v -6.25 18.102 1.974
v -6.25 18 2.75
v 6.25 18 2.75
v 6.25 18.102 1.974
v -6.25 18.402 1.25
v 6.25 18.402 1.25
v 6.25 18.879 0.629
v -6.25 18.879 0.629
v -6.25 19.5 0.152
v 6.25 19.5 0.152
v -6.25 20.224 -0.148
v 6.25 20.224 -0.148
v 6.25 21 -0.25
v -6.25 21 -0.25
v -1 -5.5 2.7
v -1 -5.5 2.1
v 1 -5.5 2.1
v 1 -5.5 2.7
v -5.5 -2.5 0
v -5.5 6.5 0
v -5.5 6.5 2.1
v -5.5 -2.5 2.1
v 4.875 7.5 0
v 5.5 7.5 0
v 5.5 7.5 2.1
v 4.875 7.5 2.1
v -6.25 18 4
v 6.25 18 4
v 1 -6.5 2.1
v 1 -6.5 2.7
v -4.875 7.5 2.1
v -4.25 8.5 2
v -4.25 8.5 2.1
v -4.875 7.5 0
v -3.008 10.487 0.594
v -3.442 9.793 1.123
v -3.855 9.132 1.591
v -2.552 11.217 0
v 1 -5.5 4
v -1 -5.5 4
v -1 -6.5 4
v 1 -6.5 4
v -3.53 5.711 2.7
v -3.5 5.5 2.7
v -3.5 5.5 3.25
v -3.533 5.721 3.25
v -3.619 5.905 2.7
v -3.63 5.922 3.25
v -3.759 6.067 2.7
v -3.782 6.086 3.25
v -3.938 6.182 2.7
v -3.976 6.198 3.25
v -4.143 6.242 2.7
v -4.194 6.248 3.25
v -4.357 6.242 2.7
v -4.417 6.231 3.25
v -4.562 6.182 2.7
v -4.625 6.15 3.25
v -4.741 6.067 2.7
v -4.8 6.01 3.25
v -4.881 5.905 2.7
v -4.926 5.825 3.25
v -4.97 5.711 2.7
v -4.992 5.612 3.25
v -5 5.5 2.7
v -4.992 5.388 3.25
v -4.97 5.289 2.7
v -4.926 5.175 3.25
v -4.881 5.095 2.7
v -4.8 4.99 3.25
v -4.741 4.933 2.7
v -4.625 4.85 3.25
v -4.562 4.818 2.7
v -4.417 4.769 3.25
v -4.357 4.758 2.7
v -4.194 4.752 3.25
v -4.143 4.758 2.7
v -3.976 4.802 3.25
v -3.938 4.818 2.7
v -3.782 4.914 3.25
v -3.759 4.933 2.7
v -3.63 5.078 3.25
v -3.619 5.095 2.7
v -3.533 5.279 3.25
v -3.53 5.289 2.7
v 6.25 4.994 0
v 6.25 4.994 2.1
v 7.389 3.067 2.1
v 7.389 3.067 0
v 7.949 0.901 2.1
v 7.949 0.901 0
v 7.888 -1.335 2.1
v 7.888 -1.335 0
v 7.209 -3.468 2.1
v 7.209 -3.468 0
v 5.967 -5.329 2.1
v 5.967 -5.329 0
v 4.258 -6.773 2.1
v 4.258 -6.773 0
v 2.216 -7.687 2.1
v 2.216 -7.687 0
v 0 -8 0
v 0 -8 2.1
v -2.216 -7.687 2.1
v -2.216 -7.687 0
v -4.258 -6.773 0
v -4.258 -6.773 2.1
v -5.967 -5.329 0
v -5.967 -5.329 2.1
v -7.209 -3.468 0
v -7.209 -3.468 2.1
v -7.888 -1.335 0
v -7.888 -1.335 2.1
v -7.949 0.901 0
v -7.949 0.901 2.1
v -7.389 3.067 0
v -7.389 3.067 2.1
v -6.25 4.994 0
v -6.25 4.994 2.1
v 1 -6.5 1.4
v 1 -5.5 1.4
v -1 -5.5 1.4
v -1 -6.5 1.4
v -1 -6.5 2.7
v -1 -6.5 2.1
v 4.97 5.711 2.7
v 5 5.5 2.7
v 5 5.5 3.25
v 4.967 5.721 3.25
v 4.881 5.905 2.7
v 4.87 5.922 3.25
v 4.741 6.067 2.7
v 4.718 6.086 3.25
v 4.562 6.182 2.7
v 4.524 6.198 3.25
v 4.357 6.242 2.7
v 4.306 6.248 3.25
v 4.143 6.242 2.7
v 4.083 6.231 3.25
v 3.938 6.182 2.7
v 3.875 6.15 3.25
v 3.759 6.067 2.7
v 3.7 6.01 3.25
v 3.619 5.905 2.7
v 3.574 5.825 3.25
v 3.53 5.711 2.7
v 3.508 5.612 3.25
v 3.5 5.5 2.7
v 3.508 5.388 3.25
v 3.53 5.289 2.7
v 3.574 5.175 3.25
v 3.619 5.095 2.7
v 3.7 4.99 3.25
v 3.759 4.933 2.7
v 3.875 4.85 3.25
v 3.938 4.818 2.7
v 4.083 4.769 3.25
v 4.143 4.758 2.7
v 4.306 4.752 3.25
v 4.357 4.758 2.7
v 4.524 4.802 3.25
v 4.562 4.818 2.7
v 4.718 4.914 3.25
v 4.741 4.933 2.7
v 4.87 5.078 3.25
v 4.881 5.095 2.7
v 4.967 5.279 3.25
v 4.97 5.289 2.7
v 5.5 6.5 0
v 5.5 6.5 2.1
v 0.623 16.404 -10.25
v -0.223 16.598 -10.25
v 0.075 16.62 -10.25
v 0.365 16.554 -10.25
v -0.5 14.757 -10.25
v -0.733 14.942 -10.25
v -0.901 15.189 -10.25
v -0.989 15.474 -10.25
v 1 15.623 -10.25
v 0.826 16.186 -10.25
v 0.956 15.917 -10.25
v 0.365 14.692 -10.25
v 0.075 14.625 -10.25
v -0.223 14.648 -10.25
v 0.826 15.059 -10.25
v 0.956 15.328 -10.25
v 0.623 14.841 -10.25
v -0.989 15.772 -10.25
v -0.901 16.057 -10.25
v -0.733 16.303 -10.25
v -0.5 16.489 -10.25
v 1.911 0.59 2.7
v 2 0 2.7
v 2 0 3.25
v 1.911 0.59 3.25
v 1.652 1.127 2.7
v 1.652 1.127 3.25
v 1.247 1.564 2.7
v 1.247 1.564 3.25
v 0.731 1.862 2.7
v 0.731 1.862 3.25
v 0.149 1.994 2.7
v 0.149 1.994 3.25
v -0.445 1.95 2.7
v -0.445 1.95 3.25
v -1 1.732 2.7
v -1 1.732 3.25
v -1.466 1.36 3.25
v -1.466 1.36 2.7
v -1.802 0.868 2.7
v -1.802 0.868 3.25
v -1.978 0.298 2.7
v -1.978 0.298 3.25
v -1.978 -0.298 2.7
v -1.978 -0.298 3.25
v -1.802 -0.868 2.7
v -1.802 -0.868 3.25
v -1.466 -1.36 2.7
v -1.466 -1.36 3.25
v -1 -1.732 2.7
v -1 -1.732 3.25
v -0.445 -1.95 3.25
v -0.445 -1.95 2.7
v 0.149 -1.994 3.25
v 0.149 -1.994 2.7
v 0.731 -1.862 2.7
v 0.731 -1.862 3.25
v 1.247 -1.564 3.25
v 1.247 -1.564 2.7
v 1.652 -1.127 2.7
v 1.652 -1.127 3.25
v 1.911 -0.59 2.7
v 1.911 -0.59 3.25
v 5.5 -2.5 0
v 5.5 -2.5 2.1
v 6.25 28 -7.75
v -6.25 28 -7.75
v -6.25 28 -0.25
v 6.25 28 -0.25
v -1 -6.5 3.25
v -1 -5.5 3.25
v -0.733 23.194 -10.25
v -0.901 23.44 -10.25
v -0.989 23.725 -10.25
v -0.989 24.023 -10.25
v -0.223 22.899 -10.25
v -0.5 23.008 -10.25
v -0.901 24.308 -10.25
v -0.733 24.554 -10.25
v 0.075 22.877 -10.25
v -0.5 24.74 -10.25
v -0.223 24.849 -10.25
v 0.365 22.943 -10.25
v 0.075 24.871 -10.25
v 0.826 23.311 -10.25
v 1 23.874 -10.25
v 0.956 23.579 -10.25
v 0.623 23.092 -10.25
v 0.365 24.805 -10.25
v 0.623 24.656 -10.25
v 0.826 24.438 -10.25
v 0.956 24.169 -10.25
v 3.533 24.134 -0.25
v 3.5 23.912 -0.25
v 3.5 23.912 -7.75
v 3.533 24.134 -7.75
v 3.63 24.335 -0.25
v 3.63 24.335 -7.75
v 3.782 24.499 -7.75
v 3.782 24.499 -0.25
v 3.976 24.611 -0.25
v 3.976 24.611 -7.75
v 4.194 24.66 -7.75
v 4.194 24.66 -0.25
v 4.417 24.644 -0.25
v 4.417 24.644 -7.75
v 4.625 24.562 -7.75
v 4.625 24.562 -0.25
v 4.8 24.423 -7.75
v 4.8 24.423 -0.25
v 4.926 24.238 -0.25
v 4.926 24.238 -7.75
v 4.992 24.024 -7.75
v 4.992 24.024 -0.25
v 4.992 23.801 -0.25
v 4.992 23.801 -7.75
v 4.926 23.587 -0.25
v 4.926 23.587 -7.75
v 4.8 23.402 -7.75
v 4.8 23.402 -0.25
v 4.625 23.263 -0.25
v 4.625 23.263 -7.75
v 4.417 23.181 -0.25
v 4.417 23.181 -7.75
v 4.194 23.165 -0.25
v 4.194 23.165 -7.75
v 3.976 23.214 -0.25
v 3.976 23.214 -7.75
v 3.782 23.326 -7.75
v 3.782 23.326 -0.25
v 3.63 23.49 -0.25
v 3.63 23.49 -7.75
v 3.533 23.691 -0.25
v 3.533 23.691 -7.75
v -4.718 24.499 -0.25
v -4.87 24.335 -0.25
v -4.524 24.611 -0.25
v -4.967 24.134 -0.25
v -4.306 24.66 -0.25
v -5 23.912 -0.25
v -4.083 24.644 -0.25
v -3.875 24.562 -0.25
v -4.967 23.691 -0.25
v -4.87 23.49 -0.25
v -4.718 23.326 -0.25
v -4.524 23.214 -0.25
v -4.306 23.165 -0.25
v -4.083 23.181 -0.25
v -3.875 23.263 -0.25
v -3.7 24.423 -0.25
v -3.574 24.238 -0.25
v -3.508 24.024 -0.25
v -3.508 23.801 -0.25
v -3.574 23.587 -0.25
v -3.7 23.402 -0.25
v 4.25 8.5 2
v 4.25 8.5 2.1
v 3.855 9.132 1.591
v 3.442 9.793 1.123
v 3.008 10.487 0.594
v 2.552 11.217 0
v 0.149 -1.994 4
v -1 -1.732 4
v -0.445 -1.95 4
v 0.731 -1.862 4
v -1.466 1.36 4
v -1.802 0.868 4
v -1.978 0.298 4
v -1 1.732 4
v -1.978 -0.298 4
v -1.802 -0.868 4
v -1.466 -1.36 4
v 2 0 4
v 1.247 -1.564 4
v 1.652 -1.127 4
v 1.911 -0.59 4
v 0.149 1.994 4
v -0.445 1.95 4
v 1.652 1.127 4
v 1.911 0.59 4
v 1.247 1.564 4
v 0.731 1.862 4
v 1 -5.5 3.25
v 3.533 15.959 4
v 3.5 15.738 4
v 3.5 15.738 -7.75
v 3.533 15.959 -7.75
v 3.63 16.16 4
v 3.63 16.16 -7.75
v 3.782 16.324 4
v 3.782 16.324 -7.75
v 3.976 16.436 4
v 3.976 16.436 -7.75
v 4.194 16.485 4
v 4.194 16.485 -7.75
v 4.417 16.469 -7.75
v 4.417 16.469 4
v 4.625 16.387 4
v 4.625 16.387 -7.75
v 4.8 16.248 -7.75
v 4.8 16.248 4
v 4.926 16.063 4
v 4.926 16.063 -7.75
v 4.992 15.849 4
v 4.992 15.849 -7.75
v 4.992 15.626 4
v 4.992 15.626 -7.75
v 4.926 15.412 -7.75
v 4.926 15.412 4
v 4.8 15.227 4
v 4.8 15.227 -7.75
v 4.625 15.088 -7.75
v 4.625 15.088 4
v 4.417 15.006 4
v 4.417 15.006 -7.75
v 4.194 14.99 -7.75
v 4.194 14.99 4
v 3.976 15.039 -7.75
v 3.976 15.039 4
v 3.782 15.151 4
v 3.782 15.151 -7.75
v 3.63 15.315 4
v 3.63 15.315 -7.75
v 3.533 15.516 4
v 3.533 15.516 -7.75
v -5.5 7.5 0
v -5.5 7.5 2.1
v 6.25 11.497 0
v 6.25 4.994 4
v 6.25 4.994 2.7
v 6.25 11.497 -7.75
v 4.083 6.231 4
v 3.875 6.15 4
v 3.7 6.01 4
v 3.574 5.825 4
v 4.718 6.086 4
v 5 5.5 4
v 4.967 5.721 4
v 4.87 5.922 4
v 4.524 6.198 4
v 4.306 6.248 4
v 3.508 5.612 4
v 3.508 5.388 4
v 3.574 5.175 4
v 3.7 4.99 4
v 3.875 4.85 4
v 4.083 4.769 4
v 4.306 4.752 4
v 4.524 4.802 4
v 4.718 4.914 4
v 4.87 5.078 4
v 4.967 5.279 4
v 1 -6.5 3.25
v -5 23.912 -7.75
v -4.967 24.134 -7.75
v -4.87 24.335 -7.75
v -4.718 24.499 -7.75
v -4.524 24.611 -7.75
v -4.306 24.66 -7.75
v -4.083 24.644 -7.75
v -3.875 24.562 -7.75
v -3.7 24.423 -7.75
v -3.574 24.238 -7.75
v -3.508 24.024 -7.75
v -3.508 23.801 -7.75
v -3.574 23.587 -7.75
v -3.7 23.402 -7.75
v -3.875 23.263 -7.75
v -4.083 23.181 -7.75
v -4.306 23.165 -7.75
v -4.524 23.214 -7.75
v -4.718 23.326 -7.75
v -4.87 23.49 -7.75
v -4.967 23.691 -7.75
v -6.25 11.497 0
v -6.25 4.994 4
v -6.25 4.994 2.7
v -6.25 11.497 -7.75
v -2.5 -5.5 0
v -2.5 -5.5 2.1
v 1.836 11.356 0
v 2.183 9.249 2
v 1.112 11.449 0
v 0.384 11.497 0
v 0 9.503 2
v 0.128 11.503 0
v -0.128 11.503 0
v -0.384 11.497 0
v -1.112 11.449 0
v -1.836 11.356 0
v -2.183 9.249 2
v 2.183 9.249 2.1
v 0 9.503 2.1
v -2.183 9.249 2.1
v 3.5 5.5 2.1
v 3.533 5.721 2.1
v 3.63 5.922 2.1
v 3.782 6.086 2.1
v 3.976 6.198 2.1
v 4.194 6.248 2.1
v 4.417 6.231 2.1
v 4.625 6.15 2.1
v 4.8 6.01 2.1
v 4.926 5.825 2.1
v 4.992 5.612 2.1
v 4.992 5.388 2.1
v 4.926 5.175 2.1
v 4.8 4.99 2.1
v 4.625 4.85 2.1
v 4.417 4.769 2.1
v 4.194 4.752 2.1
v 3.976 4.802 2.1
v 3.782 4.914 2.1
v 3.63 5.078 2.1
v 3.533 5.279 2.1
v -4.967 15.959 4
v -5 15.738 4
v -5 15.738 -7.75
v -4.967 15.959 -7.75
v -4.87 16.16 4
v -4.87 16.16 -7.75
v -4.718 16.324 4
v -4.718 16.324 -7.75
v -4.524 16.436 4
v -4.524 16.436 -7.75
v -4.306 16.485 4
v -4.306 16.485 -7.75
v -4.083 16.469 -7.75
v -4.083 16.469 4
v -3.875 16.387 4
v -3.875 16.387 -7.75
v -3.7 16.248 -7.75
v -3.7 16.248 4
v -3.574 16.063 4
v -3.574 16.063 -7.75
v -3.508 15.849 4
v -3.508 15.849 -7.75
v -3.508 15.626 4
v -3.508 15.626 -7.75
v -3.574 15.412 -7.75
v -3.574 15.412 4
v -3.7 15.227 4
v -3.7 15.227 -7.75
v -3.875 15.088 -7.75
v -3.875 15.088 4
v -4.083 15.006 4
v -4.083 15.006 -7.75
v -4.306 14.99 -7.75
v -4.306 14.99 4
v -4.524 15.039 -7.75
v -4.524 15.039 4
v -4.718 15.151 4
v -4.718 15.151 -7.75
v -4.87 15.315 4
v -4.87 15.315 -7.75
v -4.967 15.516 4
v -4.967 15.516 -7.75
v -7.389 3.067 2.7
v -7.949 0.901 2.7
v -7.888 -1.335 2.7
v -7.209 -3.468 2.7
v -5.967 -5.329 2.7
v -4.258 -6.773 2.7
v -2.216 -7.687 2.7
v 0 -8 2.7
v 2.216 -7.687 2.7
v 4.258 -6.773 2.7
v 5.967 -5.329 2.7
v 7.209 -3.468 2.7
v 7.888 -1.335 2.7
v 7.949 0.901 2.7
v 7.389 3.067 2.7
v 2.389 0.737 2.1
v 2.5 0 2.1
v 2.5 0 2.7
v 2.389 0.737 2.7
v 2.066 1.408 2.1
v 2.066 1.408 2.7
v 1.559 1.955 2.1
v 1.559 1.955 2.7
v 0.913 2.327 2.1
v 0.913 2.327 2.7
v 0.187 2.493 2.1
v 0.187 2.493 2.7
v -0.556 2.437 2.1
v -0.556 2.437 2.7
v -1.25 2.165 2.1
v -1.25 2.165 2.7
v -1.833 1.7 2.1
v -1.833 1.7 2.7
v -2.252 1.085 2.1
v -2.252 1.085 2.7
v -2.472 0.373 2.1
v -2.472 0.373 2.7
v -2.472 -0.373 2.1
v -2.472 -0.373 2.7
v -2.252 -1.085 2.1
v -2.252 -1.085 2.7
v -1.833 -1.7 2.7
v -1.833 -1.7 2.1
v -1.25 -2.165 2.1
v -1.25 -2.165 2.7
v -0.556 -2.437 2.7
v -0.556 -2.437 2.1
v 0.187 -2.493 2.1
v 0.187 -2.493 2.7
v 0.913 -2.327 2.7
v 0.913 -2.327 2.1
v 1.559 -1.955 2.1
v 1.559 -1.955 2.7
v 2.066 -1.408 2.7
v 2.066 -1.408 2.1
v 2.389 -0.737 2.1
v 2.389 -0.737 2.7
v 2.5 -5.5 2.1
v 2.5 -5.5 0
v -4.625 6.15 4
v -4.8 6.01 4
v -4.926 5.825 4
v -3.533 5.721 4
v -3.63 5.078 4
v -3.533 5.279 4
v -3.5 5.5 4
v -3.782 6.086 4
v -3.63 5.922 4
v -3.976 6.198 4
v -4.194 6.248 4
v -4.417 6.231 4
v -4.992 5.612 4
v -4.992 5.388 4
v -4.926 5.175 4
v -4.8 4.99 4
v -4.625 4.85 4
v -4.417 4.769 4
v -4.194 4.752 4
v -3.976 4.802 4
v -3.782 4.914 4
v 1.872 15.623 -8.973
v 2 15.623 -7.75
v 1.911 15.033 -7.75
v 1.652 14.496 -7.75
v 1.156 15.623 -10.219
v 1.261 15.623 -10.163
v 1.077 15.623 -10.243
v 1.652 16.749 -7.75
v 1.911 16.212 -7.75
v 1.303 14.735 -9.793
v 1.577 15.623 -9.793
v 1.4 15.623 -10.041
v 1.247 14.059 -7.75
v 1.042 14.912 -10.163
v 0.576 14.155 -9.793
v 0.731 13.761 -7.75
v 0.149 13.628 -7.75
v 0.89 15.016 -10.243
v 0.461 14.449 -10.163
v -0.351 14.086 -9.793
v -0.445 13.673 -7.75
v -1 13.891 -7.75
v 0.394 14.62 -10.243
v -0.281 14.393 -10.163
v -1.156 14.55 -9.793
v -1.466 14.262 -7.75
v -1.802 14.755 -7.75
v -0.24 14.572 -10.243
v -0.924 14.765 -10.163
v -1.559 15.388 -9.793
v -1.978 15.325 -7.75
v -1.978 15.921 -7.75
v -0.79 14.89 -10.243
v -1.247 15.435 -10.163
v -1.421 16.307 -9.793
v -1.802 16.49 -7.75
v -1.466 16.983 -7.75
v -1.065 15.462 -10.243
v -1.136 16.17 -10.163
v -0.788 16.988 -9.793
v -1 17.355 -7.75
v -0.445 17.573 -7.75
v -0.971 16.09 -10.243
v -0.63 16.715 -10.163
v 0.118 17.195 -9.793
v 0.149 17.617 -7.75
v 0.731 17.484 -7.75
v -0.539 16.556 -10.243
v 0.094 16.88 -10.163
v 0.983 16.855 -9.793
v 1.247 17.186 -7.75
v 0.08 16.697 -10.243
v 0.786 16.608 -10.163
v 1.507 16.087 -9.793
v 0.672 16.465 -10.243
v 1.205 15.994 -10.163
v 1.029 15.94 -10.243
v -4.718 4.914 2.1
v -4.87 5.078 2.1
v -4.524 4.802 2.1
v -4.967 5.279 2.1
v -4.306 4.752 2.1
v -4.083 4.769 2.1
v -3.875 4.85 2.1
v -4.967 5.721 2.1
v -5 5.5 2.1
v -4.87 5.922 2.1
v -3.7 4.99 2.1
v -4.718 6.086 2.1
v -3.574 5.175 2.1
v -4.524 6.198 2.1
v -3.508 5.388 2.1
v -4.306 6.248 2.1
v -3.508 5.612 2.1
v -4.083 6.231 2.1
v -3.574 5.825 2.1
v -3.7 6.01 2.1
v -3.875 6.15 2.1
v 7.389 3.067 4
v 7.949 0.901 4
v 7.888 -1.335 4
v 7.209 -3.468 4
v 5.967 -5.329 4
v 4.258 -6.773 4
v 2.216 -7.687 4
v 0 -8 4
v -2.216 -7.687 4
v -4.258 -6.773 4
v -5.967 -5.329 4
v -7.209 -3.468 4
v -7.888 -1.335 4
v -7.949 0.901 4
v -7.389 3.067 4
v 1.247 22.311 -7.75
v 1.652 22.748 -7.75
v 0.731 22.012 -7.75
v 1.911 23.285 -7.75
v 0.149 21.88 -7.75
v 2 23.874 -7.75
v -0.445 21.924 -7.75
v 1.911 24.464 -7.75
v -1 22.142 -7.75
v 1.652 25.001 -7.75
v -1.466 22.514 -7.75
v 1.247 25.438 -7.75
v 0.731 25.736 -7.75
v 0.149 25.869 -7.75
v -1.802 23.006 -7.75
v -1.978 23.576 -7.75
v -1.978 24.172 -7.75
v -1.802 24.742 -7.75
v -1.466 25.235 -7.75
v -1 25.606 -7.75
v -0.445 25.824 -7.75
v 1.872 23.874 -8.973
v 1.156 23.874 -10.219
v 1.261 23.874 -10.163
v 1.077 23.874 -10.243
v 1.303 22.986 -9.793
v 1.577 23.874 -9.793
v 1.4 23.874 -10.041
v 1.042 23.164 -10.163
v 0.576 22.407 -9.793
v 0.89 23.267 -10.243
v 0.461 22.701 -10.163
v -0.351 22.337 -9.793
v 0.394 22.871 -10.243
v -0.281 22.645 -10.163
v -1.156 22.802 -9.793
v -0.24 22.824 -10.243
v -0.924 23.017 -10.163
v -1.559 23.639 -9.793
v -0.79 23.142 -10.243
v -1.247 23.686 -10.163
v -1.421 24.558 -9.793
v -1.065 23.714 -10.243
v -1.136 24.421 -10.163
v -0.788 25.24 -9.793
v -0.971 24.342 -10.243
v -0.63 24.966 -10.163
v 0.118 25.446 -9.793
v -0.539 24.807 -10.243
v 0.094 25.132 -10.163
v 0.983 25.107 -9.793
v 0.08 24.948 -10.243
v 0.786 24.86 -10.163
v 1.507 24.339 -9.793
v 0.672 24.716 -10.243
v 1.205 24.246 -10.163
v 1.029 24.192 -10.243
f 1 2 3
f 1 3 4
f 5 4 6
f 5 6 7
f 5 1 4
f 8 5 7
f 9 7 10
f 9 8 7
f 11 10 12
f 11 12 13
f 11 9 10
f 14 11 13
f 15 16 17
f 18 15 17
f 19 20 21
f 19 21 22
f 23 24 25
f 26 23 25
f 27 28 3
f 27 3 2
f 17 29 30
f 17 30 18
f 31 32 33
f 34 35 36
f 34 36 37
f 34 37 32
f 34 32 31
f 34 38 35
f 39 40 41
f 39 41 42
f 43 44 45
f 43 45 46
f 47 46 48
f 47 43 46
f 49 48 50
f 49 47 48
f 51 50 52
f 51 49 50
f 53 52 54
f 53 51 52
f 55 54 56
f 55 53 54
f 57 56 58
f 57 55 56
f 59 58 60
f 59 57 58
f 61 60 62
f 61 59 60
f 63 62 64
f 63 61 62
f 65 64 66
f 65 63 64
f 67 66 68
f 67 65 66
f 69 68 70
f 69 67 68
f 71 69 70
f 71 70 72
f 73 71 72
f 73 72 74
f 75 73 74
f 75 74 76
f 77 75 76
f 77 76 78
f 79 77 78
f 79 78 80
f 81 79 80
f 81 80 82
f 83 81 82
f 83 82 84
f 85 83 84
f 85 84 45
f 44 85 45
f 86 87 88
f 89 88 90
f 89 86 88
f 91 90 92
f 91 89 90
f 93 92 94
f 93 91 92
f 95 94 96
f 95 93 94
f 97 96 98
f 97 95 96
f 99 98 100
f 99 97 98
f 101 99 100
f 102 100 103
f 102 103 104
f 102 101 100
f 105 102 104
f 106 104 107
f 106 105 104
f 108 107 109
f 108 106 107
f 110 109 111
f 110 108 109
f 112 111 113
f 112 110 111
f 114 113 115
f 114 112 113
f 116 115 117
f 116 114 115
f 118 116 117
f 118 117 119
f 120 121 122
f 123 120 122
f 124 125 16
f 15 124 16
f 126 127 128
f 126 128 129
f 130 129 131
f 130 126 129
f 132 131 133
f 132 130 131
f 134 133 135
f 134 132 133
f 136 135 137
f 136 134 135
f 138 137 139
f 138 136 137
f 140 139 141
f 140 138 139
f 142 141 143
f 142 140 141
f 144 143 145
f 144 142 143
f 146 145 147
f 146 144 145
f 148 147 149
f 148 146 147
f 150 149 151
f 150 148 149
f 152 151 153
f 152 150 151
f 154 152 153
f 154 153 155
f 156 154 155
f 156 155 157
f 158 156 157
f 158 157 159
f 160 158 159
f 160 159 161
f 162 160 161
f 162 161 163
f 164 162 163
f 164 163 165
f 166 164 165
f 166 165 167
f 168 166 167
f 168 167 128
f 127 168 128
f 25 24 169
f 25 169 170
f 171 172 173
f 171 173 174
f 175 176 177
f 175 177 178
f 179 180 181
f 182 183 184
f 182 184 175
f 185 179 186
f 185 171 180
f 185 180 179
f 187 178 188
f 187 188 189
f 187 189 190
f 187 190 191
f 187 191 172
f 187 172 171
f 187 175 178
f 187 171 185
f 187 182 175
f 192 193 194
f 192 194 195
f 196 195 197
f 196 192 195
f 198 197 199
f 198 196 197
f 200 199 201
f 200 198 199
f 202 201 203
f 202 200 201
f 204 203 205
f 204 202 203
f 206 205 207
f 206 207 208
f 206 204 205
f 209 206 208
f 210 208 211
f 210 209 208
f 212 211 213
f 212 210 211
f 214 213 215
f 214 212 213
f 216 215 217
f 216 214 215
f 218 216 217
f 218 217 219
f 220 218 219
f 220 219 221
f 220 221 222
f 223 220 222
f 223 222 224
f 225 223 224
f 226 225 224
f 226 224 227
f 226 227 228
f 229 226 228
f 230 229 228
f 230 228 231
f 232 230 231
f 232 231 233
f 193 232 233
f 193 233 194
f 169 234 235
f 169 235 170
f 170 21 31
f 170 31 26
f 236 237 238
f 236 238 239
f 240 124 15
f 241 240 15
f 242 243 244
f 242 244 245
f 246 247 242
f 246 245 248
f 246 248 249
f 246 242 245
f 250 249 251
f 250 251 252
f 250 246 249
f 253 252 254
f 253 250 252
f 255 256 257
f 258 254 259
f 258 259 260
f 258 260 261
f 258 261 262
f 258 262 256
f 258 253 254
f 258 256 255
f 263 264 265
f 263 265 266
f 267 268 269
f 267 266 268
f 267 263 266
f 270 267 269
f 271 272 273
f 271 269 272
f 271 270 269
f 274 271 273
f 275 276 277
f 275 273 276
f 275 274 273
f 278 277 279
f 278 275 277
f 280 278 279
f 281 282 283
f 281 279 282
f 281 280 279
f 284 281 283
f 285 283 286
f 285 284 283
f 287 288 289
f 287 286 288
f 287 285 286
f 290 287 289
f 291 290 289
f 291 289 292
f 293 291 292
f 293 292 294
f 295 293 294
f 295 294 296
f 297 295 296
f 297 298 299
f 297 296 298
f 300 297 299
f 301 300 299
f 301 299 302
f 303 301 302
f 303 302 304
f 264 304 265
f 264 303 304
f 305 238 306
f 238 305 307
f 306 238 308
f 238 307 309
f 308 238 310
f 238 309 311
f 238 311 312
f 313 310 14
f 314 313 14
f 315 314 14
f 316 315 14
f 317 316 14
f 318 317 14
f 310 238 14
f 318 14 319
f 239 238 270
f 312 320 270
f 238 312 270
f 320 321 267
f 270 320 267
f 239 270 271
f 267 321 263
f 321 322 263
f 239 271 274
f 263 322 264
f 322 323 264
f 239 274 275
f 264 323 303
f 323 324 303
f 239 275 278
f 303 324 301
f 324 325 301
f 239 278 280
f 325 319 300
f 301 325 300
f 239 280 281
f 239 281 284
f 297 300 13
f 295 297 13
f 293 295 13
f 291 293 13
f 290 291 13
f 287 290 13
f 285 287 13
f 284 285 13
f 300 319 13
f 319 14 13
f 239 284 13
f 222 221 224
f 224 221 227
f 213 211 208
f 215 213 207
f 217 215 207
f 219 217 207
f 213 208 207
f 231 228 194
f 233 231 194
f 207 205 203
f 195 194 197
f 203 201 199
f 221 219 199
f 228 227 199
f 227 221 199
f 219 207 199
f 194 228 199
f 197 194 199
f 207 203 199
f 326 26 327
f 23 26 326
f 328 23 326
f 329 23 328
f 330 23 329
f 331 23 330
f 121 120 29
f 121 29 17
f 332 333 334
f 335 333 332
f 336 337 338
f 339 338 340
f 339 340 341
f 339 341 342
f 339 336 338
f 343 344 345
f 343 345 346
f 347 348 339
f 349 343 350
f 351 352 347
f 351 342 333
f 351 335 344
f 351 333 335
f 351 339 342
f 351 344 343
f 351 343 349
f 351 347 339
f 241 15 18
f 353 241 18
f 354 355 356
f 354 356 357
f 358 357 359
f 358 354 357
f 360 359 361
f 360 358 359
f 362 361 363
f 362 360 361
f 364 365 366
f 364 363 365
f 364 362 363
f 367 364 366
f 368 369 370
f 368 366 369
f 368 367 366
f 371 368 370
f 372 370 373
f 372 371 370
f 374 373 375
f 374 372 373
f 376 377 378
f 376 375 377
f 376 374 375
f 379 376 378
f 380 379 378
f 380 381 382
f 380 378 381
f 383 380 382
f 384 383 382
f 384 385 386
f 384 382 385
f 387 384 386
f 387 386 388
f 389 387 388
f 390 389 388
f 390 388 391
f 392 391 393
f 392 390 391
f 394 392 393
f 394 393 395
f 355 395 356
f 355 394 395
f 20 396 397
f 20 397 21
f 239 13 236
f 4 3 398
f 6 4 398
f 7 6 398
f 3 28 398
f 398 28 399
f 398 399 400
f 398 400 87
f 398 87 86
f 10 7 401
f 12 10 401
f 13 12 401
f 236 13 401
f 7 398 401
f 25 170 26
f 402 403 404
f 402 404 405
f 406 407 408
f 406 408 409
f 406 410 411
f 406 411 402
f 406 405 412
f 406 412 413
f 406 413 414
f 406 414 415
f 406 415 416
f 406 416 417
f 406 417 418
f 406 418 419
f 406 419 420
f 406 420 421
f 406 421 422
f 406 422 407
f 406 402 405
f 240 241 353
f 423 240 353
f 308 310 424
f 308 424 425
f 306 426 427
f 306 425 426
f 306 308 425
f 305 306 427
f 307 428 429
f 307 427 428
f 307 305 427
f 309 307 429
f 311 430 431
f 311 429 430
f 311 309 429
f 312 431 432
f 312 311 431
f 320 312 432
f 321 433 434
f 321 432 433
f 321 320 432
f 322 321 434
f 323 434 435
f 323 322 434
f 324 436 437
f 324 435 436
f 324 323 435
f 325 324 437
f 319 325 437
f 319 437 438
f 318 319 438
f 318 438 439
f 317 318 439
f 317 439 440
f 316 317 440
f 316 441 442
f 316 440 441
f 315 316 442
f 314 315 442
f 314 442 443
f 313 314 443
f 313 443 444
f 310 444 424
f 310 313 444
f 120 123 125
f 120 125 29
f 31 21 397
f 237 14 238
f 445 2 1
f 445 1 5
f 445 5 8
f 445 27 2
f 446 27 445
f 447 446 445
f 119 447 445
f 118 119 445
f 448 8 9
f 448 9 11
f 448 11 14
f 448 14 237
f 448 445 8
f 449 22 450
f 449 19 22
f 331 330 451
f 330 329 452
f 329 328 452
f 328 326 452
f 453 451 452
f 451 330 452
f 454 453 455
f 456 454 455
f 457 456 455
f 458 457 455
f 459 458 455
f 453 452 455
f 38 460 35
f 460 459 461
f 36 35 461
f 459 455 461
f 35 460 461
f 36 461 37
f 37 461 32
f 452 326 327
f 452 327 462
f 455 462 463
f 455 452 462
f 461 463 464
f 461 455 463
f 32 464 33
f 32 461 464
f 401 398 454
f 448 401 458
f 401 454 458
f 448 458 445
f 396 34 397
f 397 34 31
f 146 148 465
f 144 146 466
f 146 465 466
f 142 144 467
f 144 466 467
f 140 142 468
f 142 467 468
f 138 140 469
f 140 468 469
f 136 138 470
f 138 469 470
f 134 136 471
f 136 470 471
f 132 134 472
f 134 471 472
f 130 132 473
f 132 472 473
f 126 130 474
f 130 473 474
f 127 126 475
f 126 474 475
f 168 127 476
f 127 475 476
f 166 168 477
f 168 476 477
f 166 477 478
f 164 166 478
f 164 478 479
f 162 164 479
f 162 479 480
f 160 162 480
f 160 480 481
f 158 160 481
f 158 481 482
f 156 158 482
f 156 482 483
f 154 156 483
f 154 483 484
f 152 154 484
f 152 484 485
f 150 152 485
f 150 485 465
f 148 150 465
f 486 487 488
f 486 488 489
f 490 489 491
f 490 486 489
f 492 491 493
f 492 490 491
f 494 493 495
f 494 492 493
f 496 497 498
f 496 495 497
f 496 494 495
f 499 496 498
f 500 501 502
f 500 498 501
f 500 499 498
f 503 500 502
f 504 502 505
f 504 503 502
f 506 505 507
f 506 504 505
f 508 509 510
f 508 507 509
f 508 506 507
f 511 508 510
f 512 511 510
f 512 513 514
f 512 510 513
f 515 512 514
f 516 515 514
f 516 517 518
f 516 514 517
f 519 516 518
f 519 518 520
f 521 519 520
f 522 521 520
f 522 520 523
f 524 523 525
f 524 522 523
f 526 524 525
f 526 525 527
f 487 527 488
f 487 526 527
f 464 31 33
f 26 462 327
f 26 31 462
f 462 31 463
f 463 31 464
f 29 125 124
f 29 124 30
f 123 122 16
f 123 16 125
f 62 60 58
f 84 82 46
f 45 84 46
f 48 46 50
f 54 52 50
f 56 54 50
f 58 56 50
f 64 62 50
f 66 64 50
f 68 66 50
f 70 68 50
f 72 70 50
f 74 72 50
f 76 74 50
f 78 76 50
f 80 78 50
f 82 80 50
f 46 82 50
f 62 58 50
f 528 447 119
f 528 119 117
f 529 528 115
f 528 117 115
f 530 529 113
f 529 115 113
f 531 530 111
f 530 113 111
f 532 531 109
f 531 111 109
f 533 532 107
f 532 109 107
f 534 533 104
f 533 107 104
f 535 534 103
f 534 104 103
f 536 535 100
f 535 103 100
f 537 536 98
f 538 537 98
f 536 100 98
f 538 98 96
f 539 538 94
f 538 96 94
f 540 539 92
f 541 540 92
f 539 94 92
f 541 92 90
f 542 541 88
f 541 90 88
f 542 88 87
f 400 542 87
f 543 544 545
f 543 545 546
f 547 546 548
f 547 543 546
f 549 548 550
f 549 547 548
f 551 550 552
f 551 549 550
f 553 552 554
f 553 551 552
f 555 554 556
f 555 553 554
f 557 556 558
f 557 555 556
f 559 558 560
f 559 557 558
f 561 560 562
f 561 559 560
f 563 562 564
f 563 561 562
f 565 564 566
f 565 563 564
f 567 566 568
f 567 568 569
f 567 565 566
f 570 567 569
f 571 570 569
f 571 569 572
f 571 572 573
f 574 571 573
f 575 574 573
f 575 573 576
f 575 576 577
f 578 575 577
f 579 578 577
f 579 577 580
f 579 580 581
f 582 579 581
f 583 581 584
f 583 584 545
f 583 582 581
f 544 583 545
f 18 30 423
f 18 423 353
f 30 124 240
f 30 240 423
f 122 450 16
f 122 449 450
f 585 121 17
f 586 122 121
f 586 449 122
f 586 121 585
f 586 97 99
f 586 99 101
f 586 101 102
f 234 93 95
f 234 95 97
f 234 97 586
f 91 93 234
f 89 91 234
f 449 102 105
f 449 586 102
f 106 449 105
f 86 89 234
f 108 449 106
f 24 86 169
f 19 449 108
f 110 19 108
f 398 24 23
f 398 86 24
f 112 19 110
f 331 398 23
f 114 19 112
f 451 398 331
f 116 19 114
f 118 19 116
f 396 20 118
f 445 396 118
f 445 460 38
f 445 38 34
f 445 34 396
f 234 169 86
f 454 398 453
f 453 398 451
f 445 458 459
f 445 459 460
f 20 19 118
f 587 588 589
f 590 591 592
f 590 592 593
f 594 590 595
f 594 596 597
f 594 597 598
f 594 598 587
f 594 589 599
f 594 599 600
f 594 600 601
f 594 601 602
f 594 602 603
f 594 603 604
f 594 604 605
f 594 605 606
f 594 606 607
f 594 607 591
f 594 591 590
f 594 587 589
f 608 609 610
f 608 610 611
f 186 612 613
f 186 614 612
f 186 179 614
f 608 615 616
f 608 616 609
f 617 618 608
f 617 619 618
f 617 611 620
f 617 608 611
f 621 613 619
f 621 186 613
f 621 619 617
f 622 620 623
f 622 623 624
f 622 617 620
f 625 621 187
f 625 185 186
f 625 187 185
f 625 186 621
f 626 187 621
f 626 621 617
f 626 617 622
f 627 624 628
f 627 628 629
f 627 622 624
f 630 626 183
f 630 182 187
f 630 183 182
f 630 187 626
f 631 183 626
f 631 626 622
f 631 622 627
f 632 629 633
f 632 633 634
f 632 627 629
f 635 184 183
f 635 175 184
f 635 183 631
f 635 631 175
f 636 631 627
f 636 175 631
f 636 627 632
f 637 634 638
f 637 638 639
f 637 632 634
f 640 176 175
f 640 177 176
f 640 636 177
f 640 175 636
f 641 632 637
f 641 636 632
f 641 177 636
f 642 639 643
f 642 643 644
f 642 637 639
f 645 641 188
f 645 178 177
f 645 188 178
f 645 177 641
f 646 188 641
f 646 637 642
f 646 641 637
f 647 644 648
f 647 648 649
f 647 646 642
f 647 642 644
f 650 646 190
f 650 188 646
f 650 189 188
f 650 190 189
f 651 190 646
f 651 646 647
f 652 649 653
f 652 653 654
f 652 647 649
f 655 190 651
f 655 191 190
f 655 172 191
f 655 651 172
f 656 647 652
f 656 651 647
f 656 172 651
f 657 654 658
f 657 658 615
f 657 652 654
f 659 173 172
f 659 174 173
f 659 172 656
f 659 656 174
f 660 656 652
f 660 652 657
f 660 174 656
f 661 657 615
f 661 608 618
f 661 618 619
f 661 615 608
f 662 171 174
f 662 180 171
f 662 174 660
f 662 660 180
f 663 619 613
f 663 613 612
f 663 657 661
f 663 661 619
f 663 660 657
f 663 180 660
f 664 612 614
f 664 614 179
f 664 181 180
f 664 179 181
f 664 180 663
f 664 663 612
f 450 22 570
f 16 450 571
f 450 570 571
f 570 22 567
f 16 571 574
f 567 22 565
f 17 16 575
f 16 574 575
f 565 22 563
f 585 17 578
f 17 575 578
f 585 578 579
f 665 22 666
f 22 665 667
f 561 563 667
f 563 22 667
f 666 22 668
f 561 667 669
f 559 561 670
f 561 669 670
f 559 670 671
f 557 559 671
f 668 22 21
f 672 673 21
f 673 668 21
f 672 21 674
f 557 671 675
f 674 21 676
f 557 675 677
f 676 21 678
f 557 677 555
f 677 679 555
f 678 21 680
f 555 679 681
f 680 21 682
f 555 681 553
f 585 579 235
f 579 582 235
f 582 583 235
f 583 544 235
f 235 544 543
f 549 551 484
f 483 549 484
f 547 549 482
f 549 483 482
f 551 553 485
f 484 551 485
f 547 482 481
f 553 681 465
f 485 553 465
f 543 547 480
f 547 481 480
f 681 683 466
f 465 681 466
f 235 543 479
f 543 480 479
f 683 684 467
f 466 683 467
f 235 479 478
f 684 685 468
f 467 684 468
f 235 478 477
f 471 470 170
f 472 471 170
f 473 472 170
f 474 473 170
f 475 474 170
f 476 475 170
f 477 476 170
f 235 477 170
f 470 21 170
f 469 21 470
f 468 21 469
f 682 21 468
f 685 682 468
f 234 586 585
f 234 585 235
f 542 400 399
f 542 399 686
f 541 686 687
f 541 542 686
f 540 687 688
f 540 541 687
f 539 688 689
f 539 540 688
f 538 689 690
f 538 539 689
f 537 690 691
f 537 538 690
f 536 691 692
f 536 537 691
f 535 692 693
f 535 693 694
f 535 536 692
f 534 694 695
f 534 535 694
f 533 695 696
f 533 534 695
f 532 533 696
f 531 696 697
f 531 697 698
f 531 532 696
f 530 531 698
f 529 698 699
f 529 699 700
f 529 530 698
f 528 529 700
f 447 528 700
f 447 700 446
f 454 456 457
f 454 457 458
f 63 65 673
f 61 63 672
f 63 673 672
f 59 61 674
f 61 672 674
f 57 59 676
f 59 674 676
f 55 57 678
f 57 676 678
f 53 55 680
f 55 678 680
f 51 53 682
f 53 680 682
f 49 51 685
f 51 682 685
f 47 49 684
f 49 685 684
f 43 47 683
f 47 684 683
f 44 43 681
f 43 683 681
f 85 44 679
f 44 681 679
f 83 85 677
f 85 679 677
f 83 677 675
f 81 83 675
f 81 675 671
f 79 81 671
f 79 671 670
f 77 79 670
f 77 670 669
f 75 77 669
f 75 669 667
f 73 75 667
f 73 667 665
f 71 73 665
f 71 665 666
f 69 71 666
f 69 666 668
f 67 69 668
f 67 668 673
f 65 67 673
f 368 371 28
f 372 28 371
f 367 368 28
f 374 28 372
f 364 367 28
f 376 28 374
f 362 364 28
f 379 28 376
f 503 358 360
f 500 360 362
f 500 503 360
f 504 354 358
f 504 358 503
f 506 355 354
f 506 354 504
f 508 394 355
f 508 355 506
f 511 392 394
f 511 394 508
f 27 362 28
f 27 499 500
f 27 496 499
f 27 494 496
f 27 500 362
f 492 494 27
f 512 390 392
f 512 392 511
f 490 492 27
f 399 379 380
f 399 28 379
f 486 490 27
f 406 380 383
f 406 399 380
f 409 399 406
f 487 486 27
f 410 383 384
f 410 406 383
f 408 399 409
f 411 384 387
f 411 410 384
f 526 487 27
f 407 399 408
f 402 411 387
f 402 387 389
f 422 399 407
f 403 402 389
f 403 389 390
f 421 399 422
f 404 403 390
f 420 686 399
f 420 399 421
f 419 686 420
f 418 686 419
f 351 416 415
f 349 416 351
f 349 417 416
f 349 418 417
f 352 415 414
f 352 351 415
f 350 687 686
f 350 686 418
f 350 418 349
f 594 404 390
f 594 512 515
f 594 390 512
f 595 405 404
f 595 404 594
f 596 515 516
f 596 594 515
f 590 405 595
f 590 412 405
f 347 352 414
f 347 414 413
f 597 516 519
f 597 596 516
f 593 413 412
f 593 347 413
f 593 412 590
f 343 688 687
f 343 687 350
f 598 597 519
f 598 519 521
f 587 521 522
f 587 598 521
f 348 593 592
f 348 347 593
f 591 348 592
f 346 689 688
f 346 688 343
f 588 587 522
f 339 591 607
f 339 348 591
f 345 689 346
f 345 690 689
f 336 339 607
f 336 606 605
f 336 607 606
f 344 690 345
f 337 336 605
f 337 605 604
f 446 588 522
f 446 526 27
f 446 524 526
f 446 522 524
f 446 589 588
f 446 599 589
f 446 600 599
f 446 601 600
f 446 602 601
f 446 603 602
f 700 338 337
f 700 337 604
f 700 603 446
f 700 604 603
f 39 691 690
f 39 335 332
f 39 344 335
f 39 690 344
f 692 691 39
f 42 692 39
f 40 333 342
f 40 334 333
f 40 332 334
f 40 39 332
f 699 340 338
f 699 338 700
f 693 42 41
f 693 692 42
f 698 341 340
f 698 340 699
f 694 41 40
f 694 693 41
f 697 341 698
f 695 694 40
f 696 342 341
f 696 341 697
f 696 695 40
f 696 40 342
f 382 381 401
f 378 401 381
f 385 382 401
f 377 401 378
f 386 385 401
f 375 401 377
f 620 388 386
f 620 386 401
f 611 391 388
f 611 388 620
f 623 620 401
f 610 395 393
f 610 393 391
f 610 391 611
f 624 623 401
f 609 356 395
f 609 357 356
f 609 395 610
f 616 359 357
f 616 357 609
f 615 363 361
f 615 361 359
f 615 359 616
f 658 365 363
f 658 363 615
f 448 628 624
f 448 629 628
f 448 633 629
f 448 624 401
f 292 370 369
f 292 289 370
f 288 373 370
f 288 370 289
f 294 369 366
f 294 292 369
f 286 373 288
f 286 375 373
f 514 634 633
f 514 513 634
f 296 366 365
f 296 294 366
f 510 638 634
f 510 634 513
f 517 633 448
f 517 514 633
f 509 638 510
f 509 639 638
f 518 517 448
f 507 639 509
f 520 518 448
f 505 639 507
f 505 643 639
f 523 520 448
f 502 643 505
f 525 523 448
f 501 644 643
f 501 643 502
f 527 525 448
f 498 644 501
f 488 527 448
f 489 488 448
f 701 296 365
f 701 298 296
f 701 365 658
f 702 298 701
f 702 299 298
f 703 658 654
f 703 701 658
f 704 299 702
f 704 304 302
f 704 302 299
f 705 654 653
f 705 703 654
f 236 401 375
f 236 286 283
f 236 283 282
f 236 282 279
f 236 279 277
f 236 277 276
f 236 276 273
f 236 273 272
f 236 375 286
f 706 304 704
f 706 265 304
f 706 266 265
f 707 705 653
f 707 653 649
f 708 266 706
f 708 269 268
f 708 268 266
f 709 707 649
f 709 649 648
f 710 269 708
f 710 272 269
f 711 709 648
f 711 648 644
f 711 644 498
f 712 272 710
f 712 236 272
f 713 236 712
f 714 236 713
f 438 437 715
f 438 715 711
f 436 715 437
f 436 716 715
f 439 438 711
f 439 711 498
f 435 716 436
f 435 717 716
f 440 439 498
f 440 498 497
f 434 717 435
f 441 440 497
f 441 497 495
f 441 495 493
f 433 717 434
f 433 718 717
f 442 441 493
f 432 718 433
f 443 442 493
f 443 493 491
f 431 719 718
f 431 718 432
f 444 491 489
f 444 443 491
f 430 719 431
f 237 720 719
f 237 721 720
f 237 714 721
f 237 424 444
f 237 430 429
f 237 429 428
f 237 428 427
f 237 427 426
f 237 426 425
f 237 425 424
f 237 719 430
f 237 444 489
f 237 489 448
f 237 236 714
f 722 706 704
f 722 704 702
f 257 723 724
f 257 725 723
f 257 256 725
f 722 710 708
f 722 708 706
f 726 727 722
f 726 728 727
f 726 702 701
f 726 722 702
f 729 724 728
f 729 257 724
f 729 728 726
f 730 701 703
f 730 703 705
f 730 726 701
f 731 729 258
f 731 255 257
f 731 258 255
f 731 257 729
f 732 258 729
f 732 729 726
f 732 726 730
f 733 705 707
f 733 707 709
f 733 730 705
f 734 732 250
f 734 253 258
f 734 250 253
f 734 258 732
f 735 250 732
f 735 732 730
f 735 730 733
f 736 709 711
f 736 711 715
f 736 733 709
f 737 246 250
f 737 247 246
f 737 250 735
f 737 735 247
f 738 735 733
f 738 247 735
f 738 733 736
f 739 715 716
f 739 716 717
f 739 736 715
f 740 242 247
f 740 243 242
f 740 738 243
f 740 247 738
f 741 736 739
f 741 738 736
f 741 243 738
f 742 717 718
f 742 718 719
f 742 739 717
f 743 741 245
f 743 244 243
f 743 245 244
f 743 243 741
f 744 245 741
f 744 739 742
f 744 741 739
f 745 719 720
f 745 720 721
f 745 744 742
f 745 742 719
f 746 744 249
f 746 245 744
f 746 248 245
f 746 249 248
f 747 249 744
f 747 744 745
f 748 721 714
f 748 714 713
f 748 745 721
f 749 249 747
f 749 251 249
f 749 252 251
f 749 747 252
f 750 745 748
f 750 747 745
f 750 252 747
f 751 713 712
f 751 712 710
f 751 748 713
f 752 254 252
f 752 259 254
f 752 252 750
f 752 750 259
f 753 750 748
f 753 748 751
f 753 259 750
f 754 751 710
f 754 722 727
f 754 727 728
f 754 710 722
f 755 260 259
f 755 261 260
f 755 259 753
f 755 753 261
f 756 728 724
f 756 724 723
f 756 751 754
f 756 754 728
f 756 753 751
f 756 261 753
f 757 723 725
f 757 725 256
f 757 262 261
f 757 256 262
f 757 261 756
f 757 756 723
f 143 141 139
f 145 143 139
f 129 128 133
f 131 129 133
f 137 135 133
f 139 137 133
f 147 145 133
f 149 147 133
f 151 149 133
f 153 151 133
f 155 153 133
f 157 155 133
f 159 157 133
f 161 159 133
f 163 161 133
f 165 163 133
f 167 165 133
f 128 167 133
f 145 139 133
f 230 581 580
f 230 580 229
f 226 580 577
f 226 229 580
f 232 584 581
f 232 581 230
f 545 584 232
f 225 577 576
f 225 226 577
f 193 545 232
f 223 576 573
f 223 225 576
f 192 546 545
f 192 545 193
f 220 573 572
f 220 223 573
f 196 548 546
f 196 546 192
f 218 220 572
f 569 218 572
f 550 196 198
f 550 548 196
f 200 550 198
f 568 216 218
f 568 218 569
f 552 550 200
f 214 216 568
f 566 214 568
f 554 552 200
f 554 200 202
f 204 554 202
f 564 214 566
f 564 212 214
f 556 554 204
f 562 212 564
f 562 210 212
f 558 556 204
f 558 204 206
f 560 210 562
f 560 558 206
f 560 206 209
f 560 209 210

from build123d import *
from build123d.topology import SkipClean

# Parameters (mm, degrees)
BOSS_EXTRUDE1_DEPTH     = 1.4
BOSS_EXTRUDE2_DEPTH     = 0.7
SKETCH3_W               = 2
SKETCH3_H               = 1
SKETCH3_R               = 2.5
BOSS_EXTRUDE3_DEPTH     = 0.6
SKETCH4_R               = 2
SKETCH4_R_2             = 0.75
SKETCH4_W               = 2
SKETCH4_H               = 1
BOSS_EXTRUDE4_DEPTH     = 1.3
BOSS_EXTRUDE6_REACH     = 14
CHAMFER1_SIZE           = 2
SKETCH7_W               = 12.5
SKETCH7_H               = 6.503126956
BOSS_EXTRUDE7_DEPTH     = 7.75
SKETCH8_W               = 12.5
SKETCH8_H               = 7.5
BOSS_EXTRUDE8_DEPTH     = 10
FILLET1_R               = 3
SKETCH9_W               = 11
SKETCH9_H               = 1.9
BOSS_EXTRUDE9_DEPTH     = 3.003289
BOSS_EXTRUDE10_START    = -0.75
SKETCH10_R              = 0.75
SKETCH10_R_2            = 2
SKETCH10_W              = 2
SKETCH10_H              = 1
BOSS_EXTRUDE10_DEPTH    = 0.75
SKETCH11_R              = 2
BOSS_EXTRUDE11_DEPTH    = 2.5
FILLET2_SIZE            = 2.5
FILLET2_SIZE_2          = 1
CUT_EXTRUDE1_DEPTH      = 32.401632123
CUT_EXTRUDE1_DEPTH_BACK = 32.401632123
SKETCH12_R              = 0.75
CUT_EXTRUDE2_REACH      = 34.731
SKETCH13_W              = 2.1
SKETCH13_H              = 1


with BuildPart() as part:
    # Sketch1 → Boss-Extrude1 (new body)
    with BuildSketch(Plane.XY):
        with BuildLine():
            Line((-5.5, 5.809475019), (-5.5, -2.5))
            Line((-5.5, -2.5), (-2.5, -5.5))
            Line((-2.5, -5.5), (2.5, -5.5))
            Line((2.5, -5.5), (5.5, -2.5))
            Line((5.5, -2.5), (5.5, 5.809475019))
            ThreePointArc((5.5, 5.809475019), (0, -8), (-5.5, 5.809475019))
        make_face()
    extrude(amount=BOSS_EXTRUDE1_DEPTH)

    # Sketch2 → Boss-Extrude2 (add)
    with BuildSketch(Plane.XY.offset(1.4)):
        with BuildLine():
            Line((-1, -5.5), (-1, -6.5))
            Line((-1, -6.5), (1, -6.5))
            Line((1, -6.5), (1, -5.5))
            Line((1, -5.5), (2.5, -5.5))
            Line((2.5, -5.5), (5.5, -2.5))
            Line((5.5, -2.5), (5.5, 5.809475019))
            ThreePointArc((5.5, 5.809475019), (0, -8), (-5.5, 5.809475019))
            Line((-5.5, 5.809475019), (-5.5, -2.5))
            Line((-5.5, -2.5), (-2.5, -5.5))
            Line((-2.5, -5.5), (-1, -5.5))
        make_face()
    extrude(amount=BOSS_EXTRUDE2_DEPTH)

    # Sketch3 → Boss-Extrude3 (add)
    with BuildSketch(Plane.XY.offset(2.1)):
        with BuildLine():
            Line((-5.5, 6.5), (-5.5, 5.809475019))
            ThreePointArc((-5.5, 5.809475019), (0, -8), (5.5, 5.809475019))
            Line((5.5, 5.809475019), (5.5, 6.5))
            Line((5.5, 6.5), (-5.5, 6.5))
        make_face()
        with Locations((0, -6)):
            Rectangle(SKETCH3_W, SKETCH3_H, mode=Mode.SUBTRACT)
        Circle(SKETCH3_R, mode=Mode.SUBTRACT)
        with BuildLine():
            ThreePointArc((-3.499999999, 5.5), (-4.249999999, 4.75), (-4.999999999, 5.5))
            ThreePointArc((-4.999999999, 5.5), (-4.249999999, 6.25), (-3.499999999, 5.5))
        make_face(mode=Mode.SUBTRACT)
        with BuildLine():
            ThreePointArc((5.000000001, 5.5), (4.250000001, 4.75), (3.500000001, 5.5))
            ThreePointArc((3.500000001, 5.5), (4.250000001, 6.25), (5.000000001, 5.5))
        make_face(mode=Mode.SUBTRACT)
    extrude(amount=BOSS_EXTRUDE3_DEPTH)

    # Sketch4 → Boss-Extrude4 (add)
    with SkipClean():  # the faces are left unmerged after this step: merging them gives an invalid solid
        with BuildSketch(Plane.XY.offset(2.7)):
            with BuildLine():
                Line((-5.5, 5.809475019), (-5.5, 6.5))
                Line((-5.5, 6.5), (5.5, 6.5))
                Line((5.5, 6.5), (5.5, 5.809475019))
                ThreePointArc((5.5, 5.809475019), (0, -8), (-5.5, 5.809475019))
            make_face()
            Circle(SKETCH4_R, mode=Mode.SUBTRACT)
            with Locations((-4.249999999, 5.5)):
                Circle(SKETCH4_R_2, mode=Mode.SUBTRACT)
            with Locations((4.250000001, 5.5)):
                Circle(SKETCH4_R_2, mode=Mode.SUBTRACT)
            with Locations((0, -6)):
                Rectangle(SKETCH4_W, SKETCH4_H, mode=Mode.SUBTRACT)
        extrude(amount=BOSS_EXTRUDE4_DEPTH)

    # Boss-Extrude6: up to this face of the body (flat: up to its plane)
    boss_extrude6_end = Plane(part.part.faces().sort_by_distance((0, -7.784071771, 4))[0])
    # Sketch5 → Boss-Extrude6 (add, up to the picked face)
    with BuildSketch(Plane.XY, mode=Mode.PRIVATE) as boss_extrude6_sk1:
        with BuildLine():
            Line((-6.25, 4.993746089), (-6.25, 18))
            Line((-6.25, 18), (6.25, 18))
            Line((6.25, 18), (6.25, 4.993746089))
            ThreePointArc((6.25, 4.993746089), (5.88914072, 5.414611858), (5.5, 5.809475019))
            Line((5.5, 5.809475019), (5.5, 6.5))
            Line((5.5, 6.5), (4.249999999, 8.5))
            ThreePointArc((4.249999999, 8.5), (0, 9.503288904), (-4.249999999, 8.5))
            Line((-4.249999999, 8.5), (-5.5, 6.5))
            Line((-5.5, 6.5), (-5.5, 5.809475019))
            ThreePointArc((-5.5, 5.809475019), (-5.88914072, 5.414611858), (-6.25, 4.993746089))
        make_face()
    boss_extrude6_tool1 = split(extrude(boss_extrude6_sk1.sketch, amount=BOSS_EXTRUDE6_REACH, mode=Mode.PRIVATE), bisect_by=boss_extrude6_end, keep=Keep.BOTH, mode=Mode.PRIVATE)
    add(boss_extrude6_tool1.solids().sort_by(Axis((0, 13.103061, 0), (0, 0, 1)))[0])

    # Chamfer1
    chamfer1_edges = [part.edges().sort_by_distance(p)[0] for p in [
        (0, 9.503288904, 0),
    ]]
    chamfer(chamfer1_edges, length=CHAMFER1_SIZE)

    # Sketch7 → Boss-Extrude7 (add)
    with BuildSketch(Plane(origin=(0, 0, 0), x_dir=(-1, 0, 0), z_dir=(0, 0, -1))):
        with Locations((0, 14.748436522)):
            Rectangle(SKETCH7_W, SKETCH7_H)
    extrude(amount=BOSS_EXTRUDE7_DEPTH)

    # Sketch8 → Boss-Extrude8 (add)
    with SkipClean():  # the faces are left unmerged after this step: merging them gives an invalid solid
        with BuildSketch(Plane(origin=(0, 18, 0), x_dir=(1, 0, 0), z_dir=(0, 1, 0))):
            with Locations((0, 4)):
                Rectangle(SKETCH8_W, SKETCH8_H)
        extrude(amount=BOSS_EXTRUDE8_DEPTH)

    # Fillet1
    # the kernel refuses this fillet: 3 mm, written as the material it adds along each edge
    with BuildSketch(Plane(origin=(-6.25, 18, -0.25), x_dir=(0, 0, 1), z_dir=(1, 0, 0))) as fillet1_piece_1:
        with BuildLine():
            CenterArc((FILLET1_R, -FILLET1_R), FILLET1_R, 90, 90)
            Line((0, -FILLET1_R), (0, 0))
            Line((0, 0), (FILLET1_R, 0))
        make_face()
    extrude(amount=12.5)

    # Sketch9 → Boss-Extrude9 (add)
    with BuildSketch(Plane(origin=(0, 6.5, 0), x_dir=(1, 0, 0), z_dir=(0, 1, 0))):
        with Locations((0, -3.05)):
            Rectangle(SKETCH9_W, SKETCH9_H)
    extrude(amount=BOSS_EXTRUDE9_DEPTH)

    # Sketch10 → Boss-Extrude10 (add)
    with SkipClean():  # the faces are left unmerged after this step: merging them gives an invalid solid
        with BuildSketch(Plane.XY.offset(4).offset(BOSS_EXTRUDE10_START)):
            with Locations((4.250000001, 5.5)):
                Circle(SKETCH10_R)
            with Locations((-4.249999999, 5.5)):
                Circle(SKETCH10_R)
            Circle(SKETCH10_R_2)
            with Locations((0, -6)):
                Rectangle(SKETCH10_W, SKETCH10_H)
        extrude(amount=BOSS_EXTRUDE10_DEPTH)
    add(part.part.scale(1), mode=Mode.REPLACE)  # the faces are merged on a copy

    # Sketch11 → Boss-Extrude11 (add)
    with BuildSketch(Plane(origin=(0, 0, -7.75), x_dir=(-1, 0, 0), z_dir=(0, 0, -1))):
        with Locations(Location((0, 15.622654783, 0), (0, 0, 180))):
            Circle(SKETCH11_R)
        with Locations(Location((0, 23.874218261, 0), (0, 0, 180))):
            Circle(SKETCH11_R)
    extrude(amount=BOSS_EXTRUDE11_DEPTH)

    # Fillet2
    # an asymmetric fillet: 2.5, 1 mm, written as the material it takes off along each edge
    with BuildSketch(Plane(origin=(0, 15.622654783, -10.25), x_dir=(1, 0, 0), z_dir=(0, 1, 0))) as fillet2_piece_1:
        with BuildLine():
            Bezier((2, -FILLET2_SIZE), (2, 0), (2 - FILLET2_SIZE_2, 0), weights=[1, 0.707106781, 1])
            Line((2 - FILLET2_SIZE_2, 0), (2, 0))
            Line((2, 0), (2, -FILLET2_SIZE))
        make_face()
    revolve(axis=Axis((0, 15.622654783, -10.25), (0, 0, -1)), mode=Mode.SUBTRACT)
    with BuildSketch(Plane(origin=(0, 23.874218261, -10.25), x_dir=(1, 0, 0), z_dir=(0, 1, 0))) as fillet2_piece_2:
        with BuildLine():
            Bezier((2, -FILLET2_SIZE), (2, 0), (2 - FILLET2_SIZE_2, 0), weights=[1, 0.707106781, 1])
            Line((2 - FILLET2_SIZE_2, 0), (2, 0))
            Line((2, 0), (2, -FILLET2_SIZE))
        make_face()
    revolve(axis=Axis((0, 23.874218261, -10.25), (0, 0, -1)), mode=Mode.SUBTRACT)

    # Sketch12 → Cut-Extrude1 (cut, two sides: drawn at the far end of the back side and taken through both)
    with BuildSketch(Plane(origin=(0, 0, -7.75), x_dir=(-1, 0, 0), z_dir=(0, 0, -1)).offset(-CUT_EXTRUDE1_DEPTH_BACK)):
        with Locations((-4.25, 15.7375)):
            Circle(SKETCH12_R)
        with Locations((-4.25, 23.9125)):
            Circle(SKETCH12_R)
        with Locations((4.25, 23.9125)):
            Circle(SKETCH12_R)
        with Locations((4.25, 15.7375)):
            Circle(SKETCH12_R)
    extrude(amount=CUT_EXTRUDE1_DEPTH + CUT_EXTRUDE1_DEPTH_BACK, mode=Mode.SUBTRACT)

    # Cut-Extrude2: up to this face of the body (flat: up to its plane)
    cut_extrude2_end = Plane(part.part.faces().sort_by_distance((-5.5, 2, 1.05))[0])
    # Sketch13 → Cut-Extrude2 (cut, up to the picked face)
    with BuildSketch(Plane.ZY.offset(-5.5), mode=Mode.PRIVATE) as cut_extrude2_sk1:
        with Locations((1.05, 7)):
            Rectangle(SKETCH13_W, SKETCH13_H)
    cut_extrude2_tool1 = split(extrude(cut_extrude2_sk1.sketch, amount=CUT_EXTRUDE2_REACH, mode=Mode.PRIVATE), bisect_by=cut_extrude2_end, keep=Keep.BOTH, mode=Mode.PRIVATE)
    add(cut_extrude2_tool1.solids().sort_by(Axis((5.5, 7, 1.05), (-1, 0, 0)))[0], mode=Mode.SUBTRACT)


solid = part.part
